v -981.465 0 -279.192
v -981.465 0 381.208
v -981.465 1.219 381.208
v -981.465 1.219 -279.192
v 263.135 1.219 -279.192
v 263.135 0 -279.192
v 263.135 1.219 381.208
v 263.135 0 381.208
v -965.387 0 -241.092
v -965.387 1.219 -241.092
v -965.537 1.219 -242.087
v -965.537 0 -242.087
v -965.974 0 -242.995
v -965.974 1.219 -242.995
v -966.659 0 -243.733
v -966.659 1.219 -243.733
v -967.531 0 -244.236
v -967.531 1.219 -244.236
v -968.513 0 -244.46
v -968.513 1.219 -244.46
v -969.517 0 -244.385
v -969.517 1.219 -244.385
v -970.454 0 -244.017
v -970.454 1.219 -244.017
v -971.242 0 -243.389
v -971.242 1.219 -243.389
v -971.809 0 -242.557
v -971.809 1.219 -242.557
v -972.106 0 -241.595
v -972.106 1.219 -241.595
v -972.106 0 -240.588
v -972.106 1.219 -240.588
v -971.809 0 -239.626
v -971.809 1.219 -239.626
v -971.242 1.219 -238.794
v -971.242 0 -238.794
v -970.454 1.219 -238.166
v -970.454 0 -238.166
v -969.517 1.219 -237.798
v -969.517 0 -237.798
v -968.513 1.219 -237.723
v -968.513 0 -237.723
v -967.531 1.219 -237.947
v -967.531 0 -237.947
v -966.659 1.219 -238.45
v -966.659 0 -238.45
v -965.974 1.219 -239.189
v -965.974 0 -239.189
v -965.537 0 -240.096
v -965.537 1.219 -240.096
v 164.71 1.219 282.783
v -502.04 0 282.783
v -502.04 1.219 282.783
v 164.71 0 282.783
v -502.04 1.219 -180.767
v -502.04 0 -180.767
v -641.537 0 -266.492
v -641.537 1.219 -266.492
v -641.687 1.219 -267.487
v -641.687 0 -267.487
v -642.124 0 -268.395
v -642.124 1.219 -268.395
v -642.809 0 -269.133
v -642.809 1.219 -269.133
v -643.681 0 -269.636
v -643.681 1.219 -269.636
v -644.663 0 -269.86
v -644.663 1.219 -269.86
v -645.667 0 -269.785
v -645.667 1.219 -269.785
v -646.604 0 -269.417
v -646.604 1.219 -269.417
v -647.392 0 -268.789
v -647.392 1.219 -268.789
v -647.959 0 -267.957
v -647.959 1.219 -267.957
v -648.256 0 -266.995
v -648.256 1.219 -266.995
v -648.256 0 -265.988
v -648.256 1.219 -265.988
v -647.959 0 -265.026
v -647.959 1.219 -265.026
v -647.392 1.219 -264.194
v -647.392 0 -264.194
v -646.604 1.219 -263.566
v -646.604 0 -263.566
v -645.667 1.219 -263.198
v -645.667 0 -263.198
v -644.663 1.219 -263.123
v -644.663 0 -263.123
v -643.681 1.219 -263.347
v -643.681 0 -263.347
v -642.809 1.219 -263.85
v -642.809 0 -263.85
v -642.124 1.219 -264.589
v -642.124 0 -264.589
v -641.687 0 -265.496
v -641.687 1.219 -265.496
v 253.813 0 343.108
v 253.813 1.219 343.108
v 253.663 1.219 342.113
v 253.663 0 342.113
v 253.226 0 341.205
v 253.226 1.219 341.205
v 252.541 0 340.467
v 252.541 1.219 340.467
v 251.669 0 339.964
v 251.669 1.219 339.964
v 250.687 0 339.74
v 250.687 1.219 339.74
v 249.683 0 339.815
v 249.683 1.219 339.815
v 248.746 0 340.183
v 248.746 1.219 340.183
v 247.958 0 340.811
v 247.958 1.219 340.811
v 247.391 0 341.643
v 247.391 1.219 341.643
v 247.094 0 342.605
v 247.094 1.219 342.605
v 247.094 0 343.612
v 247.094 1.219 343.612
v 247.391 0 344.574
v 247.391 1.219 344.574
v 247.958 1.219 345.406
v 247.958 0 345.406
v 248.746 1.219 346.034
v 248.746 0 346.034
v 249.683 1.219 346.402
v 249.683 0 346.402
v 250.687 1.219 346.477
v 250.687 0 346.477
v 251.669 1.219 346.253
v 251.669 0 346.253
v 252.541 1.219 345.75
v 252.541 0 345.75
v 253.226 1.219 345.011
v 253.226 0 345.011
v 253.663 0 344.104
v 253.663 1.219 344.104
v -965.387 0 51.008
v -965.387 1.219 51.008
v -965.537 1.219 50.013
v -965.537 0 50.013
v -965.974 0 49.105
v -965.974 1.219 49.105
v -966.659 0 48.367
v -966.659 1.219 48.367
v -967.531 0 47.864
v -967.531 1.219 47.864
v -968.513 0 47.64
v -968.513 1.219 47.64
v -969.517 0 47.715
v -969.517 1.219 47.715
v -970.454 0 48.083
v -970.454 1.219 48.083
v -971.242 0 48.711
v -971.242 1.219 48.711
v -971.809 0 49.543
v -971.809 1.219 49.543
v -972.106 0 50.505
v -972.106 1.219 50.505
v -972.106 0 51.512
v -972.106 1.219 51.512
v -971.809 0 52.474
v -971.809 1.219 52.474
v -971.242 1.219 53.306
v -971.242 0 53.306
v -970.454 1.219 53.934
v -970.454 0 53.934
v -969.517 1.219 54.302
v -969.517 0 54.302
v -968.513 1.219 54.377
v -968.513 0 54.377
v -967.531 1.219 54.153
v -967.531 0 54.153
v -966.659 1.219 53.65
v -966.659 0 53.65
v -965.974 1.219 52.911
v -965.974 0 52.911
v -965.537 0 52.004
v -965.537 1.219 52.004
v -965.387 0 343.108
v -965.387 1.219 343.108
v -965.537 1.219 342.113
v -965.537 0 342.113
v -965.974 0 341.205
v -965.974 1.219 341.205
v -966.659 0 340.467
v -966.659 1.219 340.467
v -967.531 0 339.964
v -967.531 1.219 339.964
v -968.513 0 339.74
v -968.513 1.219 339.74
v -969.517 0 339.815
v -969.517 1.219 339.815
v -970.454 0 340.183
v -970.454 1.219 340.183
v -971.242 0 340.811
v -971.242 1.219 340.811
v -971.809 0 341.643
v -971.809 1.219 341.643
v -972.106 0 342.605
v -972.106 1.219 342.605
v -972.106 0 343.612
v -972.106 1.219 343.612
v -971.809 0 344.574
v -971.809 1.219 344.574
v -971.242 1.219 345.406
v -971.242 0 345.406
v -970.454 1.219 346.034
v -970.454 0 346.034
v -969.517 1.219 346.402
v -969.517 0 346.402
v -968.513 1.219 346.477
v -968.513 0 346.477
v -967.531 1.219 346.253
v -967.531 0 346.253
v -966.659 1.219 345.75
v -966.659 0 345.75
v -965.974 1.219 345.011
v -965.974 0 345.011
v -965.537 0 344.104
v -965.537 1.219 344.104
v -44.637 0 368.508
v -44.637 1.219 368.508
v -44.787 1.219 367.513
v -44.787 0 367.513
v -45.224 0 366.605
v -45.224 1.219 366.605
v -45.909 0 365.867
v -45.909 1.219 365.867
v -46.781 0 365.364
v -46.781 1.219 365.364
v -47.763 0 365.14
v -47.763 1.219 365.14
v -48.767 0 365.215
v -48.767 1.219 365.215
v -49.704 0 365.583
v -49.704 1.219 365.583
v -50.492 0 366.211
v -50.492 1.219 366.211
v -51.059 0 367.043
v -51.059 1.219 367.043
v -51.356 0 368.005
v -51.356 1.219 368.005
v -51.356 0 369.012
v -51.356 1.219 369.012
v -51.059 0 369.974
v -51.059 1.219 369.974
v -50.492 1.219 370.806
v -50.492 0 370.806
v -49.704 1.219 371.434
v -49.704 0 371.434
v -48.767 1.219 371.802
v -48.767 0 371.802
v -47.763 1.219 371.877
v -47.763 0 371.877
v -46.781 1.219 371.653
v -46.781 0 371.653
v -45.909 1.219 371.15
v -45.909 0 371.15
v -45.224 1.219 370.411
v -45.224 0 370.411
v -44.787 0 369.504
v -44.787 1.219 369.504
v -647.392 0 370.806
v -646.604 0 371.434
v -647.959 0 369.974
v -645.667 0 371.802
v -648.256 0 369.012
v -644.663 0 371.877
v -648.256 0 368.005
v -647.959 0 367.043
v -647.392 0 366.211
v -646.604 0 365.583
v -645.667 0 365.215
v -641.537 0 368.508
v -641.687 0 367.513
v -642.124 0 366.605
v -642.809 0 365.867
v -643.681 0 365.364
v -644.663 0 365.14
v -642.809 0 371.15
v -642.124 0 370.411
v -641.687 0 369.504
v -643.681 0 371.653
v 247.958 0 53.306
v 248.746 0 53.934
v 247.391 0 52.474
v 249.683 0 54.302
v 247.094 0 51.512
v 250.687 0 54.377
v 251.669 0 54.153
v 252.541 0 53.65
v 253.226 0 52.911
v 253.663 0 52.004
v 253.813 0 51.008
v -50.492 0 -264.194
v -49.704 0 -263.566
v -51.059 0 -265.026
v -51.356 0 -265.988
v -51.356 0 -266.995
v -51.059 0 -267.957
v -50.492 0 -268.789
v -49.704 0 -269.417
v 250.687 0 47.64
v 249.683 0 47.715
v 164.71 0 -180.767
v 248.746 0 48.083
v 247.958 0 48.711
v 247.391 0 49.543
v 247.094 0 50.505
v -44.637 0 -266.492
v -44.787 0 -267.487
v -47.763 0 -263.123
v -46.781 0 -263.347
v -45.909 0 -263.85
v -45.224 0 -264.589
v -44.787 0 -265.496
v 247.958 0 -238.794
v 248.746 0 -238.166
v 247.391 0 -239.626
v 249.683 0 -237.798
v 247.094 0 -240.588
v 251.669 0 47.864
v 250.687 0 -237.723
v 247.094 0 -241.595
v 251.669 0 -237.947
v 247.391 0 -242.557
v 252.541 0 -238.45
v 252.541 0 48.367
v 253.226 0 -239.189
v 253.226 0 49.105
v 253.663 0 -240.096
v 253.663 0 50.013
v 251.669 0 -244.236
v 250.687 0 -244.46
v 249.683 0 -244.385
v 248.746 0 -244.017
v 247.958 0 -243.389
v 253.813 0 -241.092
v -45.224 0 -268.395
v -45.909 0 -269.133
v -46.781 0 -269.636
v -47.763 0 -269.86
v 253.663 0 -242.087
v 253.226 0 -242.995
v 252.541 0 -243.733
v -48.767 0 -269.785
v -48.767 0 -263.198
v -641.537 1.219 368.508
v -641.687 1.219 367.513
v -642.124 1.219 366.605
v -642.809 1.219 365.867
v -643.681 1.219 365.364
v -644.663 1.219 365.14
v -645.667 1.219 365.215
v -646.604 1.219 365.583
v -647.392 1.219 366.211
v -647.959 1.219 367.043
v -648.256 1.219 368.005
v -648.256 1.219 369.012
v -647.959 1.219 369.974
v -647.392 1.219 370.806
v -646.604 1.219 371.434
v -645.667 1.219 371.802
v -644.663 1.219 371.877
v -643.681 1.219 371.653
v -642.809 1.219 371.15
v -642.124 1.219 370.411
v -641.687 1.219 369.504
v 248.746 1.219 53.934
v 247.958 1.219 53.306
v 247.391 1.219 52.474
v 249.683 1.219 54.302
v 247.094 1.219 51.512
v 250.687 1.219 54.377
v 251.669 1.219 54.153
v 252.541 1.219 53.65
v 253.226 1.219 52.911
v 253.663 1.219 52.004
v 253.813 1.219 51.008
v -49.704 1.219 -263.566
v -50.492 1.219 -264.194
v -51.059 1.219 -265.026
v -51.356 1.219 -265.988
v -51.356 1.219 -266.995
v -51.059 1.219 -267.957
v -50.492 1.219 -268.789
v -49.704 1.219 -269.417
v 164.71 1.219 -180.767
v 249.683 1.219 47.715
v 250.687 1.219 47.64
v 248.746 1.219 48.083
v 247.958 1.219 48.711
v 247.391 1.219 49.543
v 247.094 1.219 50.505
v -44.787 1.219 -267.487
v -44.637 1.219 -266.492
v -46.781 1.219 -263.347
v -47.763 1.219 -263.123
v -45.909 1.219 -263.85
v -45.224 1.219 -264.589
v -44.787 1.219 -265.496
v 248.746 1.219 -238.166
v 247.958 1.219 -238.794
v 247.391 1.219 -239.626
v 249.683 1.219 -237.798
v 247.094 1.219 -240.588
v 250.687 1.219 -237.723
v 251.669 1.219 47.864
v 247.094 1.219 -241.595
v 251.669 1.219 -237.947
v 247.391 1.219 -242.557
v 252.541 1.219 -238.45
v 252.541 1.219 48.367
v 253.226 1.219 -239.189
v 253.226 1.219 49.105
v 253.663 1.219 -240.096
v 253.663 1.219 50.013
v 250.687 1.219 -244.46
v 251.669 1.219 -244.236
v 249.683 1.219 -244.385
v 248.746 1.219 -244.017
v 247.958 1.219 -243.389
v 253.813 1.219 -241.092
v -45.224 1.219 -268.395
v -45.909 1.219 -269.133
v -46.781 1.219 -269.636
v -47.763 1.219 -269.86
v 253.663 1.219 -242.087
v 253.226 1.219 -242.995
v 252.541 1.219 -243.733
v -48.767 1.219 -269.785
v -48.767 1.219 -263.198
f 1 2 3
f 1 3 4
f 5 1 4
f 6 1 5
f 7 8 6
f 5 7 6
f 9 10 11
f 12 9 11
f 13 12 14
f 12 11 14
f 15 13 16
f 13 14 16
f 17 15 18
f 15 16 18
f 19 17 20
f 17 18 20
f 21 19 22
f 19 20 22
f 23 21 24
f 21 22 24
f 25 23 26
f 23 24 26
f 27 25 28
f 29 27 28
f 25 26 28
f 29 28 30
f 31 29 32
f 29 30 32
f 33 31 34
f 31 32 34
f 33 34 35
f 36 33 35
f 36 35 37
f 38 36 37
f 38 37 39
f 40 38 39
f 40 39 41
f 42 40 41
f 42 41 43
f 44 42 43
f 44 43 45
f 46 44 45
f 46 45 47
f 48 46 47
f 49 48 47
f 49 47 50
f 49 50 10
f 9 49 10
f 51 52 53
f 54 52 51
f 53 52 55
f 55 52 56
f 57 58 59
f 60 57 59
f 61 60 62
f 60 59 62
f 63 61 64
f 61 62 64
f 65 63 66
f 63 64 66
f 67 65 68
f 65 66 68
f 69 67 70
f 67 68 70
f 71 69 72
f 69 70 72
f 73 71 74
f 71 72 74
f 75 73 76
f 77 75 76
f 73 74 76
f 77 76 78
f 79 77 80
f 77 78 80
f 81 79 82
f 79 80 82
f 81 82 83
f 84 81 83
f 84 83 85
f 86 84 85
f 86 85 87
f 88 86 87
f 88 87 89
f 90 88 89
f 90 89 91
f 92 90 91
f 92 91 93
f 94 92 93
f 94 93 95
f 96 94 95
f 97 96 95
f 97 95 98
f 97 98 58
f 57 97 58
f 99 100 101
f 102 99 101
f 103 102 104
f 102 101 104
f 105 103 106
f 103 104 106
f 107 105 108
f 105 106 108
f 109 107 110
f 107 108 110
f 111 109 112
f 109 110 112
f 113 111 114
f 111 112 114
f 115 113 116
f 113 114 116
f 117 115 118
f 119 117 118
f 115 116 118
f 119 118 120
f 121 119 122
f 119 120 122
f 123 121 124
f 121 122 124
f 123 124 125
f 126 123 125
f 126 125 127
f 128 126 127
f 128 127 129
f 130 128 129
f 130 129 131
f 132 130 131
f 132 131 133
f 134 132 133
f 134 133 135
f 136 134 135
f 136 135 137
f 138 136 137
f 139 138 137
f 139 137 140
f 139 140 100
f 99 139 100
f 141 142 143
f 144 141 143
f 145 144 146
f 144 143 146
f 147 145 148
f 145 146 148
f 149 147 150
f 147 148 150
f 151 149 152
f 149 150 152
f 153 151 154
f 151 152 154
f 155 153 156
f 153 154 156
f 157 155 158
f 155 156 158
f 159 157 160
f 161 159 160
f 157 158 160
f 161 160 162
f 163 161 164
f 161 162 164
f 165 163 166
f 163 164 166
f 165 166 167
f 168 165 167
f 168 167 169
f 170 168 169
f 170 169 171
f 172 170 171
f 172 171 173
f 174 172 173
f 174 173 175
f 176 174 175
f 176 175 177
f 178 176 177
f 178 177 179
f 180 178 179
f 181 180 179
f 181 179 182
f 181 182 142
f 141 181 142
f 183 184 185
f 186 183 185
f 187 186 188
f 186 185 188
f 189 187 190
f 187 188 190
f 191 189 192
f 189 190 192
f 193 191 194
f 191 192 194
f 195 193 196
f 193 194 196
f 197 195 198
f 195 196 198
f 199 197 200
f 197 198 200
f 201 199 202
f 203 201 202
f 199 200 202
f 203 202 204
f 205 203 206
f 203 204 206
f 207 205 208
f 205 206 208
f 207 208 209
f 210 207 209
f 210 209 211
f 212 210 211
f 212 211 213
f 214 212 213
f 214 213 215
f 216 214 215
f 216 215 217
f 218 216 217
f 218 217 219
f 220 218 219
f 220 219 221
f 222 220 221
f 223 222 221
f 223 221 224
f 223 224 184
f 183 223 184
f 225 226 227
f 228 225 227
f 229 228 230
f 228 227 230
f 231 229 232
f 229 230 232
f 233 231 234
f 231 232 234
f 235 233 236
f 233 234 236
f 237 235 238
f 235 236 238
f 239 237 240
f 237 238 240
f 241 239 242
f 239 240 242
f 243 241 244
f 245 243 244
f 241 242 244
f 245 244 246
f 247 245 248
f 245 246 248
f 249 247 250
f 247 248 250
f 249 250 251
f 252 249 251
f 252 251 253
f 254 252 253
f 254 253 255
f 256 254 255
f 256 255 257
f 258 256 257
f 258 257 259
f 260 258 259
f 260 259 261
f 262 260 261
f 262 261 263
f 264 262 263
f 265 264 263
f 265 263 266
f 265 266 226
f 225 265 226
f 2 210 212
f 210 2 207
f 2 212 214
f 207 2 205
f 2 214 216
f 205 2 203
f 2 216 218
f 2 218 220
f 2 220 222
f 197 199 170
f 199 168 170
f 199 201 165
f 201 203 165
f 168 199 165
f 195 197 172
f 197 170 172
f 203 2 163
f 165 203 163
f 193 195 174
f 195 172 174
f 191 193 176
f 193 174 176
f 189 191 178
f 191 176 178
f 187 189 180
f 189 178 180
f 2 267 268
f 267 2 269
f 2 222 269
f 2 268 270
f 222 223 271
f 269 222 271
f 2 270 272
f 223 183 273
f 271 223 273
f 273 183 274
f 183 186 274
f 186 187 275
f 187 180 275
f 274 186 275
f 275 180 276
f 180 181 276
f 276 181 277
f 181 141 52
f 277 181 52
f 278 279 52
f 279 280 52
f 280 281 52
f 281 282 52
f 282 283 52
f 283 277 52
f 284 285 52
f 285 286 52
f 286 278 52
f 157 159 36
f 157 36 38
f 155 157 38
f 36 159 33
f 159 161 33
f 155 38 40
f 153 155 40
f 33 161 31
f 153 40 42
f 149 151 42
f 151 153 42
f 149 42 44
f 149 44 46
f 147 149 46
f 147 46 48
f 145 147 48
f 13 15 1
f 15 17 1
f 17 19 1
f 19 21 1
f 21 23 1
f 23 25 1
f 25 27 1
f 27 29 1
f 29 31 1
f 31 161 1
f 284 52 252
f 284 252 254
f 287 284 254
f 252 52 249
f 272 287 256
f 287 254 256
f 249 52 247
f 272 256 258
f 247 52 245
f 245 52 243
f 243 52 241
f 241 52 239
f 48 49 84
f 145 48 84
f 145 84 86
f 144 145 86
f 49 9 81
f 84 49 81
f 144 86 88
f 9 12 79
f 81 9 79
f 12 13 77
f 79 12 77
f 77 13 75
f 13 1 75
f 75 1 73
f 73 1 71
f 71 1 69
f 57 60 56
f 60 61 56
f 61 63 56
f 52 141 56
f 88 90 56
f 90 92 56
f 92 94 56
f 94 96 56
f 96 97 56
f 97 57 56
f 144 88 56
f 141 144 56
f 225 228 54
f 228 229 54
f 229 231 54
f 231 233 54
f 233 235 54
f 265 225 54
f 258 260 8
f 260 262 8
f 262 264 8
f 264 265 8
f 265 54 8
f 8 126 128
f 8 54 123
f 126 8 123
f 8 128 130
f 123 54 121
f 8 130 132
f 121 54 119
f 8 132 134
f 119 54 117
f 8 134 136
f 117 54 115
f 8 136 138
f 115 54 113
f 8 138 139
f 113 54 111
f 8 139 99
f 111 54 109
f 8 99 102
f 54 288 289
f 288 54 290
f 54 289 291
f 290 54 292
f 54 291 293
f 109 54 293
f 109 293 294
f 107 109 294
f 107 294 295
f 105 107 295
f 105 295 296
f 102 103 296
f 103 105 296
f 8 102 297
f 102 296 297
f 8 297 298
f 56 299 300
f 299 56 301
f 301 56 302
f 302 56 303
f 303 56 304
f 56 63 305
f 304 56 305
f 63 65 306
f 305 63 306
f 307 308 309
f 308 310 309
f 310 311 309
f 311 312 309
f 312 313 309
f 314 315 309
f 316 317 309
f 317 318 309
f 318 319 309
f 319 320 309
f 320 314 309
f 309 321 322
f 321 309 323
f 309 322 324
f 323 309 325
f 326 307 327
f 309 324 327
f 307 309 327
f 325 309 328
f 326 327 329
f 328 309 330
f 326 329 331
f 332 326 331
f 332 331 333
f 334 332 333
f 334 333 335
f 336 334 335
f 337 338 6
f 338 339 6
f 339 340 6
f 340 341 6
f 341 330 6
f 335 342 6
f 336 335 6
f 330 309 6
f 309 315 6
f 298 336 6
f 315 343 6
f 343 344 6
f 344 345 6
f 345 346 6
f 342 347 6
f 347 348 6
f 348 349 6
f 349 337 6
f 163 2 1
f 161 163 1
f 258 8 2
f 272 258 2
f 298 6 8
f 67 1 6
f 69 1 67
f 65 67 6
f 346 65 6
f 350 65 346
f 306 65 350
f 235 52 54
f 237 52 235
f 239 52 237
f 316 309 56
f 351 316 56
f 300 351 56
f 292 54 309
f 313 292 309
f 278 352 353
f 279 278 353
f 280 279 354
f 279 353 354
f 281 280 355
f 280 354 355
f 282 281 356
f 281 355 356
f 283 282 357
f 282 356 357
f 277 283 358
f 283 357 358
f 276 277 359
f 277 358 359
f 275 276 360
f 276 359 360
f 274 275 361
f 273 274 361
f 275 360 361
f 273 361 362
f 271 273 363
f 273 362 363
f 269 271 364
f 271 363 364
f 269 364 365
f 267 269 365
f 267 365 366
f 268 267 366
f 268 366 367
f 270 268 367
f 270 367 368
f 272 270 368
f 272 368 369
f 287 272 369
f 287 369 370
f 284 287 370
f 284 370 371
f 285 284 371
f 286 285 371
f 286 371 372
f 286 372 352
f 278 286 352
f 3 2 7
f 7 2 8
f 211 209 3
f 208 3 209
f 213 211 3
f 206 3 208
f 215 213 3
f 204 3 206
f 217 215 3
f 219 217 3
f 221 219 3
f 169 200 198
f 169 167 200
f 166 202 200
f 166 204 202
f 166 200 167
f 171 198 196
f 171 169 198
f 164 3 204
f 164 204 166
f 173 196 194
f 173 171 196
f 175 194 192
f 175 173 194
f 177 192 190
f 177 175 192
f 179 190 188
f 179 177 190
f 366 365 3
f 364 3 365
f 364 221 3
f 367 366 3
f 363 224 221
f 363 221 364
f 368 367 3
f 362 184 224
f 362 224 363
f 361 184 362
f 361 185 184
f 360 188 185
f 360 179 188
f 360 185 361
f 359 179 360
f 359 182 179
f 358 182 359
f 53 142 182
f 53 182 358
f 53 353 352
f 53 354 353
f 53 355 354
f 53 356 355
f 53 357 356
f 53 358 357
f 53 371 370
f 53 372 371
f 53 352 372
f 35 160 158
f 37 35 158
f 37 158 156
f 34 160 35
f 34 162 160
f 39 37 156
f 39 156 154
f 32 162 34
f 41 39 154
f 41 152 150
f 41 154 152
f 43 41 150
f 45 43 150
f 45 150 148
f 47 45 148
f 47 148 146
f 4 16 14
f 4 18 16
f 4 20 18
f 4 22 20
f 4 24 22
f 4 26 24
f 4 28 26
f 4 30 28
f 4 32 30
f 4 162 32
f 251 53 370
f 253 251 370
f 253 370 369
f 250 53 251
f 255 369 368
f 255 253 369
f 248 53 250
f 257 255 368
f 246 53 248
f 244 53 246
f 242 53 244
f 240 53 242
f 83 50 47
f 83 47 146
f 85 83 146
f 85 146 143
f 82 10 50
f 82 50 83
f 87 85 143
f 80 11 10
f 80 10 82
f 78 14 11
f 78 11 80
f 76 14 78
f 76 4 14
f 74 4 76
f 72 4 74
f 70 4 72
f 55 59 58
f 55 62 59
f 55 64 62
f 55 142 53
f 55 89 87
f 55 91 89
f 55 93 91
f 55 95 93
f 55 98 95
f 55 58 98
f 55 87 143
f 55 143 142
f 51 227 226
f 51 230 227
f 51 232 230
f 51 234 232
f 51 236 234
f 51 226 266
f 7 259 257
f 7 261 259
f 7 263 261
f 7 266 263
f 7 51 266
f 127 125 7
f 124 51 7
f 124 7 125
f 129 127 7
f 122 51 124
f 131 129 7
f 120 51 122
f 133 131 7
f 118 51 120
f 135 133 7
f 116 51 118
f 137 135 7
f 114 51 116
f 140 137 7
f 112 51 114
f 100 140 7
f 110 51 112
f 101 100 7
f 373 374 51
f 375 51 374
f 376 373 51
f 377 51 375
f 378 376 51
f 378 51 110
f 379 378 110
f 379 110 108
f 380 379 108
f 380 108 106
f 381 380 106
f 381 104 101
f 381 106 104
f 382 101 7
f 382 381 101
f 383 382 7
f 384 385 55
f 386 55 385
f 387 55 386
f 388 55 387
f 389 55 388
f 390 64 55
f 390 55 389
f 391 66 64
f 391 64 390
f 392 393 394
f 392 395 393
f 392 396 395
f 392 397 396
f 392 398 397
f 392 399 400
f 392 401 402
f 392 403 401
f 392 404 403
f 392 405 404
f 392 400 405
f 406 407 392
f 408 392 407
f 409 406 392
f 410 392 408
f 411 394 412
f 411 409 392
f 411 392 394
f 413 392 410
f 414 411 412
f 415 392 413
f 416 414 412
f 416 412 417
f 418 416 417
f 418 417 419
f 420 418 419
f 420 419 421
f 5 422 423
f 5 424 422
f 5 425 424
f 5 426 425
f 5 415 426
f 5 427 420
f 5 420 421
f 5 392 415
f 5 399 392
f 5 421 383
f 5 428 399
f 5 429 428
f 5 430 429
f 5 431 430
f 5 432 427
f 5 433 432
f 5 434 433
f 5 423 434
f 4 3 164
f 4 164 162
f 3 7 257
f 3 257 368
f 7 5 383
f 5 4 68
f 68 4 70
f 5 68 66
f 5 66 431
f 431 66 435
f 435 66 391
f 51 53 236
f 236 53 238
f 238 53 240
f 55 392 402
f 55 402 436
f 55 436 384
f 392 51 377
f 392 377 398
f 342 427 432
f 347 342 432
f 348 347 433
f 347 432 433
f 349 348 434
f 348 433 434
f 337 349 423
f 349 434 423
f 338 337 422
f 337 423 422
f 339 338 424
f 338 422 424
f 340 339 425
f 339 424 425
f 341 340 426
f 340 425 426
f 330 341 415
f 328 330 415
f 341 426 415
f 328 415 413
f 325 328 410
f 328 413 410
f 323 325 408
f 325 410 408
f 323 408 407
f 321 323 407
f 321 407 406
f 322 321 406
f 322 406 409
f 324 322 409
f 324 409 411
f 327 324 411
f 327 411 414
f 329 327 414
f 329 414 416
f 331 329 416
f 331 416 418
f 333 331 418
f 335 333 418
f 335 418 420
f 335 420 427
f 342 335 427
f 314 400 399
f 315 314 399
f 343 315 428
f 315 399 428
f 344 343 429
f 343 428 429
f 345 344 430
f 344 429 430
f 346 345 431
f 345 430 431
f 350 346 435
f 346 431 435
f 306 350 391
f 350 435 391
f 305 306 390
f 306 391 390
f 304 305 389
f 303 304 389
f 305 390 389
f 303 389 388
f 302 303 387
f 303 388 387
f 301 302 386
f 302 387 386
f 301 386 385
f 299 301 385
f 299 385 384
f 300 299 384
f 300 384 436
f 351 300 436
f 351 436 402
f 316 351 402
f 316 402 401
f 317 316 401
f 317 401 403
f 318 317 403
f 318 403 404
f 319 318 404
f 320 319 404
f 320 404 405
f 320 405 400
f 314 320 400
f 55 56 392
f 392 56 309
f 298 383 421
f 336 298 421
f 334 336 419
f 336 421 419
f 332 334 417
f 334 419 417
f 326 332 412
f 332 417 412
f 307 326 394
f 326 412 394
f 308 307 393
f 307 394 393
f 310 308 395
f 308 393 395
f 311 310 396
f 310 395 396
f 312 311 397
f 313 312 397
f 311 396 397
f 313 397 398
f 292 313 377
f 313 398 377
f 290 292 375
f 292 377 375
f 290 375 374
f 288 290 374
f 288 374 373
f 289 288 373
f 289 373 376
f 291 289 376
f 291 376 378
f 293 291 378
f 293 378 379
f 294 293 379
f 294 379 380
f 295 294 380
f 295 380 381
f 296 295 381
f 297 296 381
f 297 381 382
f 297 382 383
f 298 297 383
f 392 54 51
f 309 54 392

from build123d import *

# Parameters (mm, degrees)
SKETCH1_W               = 1244.6
SKETCH1_H               = 660.4
SKETCH1_W_2             = 666.75
SKETCH1_H_2             = 463.55
BOSS_EXTRUDE1_DEPTH     = 1.2192
F_1_4_CLEARANCE_HOLE1_D = 6.7564


with BuildPart() as part:
    # Sketch1 → Boss-Extrude1 (new body)
    with BuildSketch(Plane(origin=(0, 0, 0), x_dir=(1, 0, 0), z_dir=(0, 1, 0))):
        with Locations((-359.165172795, -51.008449371)):
            Rectangle(SKETCH1_W, SKETCH1_H)
        with Locations((-168.665172795, -51.008449371)):
            Rectangle(SKETCH1_W_2, SKETCH1_H_2, mode=Mode.SUBTRACT)
    extrude(amount=BOSS_EXTRUDE1_DEPTH)

    # 1/4 Clearance Hole1 (through all)
    with Locations(Plane(origin=(0, 0, 0), x_dir=(-1, 0, 0), z_dir=(0, -1, 0))):
        with Locations((968.765172795, 241.091550629), (968.765172795, -51.008449371), (968.765172795, -343.108449371), (644.915172795, -368.508449371), (644.915172795, 266.491550629), (48.015172795, 266.491550629), (-250.434827205, 241.091550629), (-250.434827205, -51.008449371), (-250.434827205, -343.108449371), (48.015172795, -368.508449371)):
            Hole(F_1_4_CLEARANCE_HOLE1_D / 2)


solid = part.part
